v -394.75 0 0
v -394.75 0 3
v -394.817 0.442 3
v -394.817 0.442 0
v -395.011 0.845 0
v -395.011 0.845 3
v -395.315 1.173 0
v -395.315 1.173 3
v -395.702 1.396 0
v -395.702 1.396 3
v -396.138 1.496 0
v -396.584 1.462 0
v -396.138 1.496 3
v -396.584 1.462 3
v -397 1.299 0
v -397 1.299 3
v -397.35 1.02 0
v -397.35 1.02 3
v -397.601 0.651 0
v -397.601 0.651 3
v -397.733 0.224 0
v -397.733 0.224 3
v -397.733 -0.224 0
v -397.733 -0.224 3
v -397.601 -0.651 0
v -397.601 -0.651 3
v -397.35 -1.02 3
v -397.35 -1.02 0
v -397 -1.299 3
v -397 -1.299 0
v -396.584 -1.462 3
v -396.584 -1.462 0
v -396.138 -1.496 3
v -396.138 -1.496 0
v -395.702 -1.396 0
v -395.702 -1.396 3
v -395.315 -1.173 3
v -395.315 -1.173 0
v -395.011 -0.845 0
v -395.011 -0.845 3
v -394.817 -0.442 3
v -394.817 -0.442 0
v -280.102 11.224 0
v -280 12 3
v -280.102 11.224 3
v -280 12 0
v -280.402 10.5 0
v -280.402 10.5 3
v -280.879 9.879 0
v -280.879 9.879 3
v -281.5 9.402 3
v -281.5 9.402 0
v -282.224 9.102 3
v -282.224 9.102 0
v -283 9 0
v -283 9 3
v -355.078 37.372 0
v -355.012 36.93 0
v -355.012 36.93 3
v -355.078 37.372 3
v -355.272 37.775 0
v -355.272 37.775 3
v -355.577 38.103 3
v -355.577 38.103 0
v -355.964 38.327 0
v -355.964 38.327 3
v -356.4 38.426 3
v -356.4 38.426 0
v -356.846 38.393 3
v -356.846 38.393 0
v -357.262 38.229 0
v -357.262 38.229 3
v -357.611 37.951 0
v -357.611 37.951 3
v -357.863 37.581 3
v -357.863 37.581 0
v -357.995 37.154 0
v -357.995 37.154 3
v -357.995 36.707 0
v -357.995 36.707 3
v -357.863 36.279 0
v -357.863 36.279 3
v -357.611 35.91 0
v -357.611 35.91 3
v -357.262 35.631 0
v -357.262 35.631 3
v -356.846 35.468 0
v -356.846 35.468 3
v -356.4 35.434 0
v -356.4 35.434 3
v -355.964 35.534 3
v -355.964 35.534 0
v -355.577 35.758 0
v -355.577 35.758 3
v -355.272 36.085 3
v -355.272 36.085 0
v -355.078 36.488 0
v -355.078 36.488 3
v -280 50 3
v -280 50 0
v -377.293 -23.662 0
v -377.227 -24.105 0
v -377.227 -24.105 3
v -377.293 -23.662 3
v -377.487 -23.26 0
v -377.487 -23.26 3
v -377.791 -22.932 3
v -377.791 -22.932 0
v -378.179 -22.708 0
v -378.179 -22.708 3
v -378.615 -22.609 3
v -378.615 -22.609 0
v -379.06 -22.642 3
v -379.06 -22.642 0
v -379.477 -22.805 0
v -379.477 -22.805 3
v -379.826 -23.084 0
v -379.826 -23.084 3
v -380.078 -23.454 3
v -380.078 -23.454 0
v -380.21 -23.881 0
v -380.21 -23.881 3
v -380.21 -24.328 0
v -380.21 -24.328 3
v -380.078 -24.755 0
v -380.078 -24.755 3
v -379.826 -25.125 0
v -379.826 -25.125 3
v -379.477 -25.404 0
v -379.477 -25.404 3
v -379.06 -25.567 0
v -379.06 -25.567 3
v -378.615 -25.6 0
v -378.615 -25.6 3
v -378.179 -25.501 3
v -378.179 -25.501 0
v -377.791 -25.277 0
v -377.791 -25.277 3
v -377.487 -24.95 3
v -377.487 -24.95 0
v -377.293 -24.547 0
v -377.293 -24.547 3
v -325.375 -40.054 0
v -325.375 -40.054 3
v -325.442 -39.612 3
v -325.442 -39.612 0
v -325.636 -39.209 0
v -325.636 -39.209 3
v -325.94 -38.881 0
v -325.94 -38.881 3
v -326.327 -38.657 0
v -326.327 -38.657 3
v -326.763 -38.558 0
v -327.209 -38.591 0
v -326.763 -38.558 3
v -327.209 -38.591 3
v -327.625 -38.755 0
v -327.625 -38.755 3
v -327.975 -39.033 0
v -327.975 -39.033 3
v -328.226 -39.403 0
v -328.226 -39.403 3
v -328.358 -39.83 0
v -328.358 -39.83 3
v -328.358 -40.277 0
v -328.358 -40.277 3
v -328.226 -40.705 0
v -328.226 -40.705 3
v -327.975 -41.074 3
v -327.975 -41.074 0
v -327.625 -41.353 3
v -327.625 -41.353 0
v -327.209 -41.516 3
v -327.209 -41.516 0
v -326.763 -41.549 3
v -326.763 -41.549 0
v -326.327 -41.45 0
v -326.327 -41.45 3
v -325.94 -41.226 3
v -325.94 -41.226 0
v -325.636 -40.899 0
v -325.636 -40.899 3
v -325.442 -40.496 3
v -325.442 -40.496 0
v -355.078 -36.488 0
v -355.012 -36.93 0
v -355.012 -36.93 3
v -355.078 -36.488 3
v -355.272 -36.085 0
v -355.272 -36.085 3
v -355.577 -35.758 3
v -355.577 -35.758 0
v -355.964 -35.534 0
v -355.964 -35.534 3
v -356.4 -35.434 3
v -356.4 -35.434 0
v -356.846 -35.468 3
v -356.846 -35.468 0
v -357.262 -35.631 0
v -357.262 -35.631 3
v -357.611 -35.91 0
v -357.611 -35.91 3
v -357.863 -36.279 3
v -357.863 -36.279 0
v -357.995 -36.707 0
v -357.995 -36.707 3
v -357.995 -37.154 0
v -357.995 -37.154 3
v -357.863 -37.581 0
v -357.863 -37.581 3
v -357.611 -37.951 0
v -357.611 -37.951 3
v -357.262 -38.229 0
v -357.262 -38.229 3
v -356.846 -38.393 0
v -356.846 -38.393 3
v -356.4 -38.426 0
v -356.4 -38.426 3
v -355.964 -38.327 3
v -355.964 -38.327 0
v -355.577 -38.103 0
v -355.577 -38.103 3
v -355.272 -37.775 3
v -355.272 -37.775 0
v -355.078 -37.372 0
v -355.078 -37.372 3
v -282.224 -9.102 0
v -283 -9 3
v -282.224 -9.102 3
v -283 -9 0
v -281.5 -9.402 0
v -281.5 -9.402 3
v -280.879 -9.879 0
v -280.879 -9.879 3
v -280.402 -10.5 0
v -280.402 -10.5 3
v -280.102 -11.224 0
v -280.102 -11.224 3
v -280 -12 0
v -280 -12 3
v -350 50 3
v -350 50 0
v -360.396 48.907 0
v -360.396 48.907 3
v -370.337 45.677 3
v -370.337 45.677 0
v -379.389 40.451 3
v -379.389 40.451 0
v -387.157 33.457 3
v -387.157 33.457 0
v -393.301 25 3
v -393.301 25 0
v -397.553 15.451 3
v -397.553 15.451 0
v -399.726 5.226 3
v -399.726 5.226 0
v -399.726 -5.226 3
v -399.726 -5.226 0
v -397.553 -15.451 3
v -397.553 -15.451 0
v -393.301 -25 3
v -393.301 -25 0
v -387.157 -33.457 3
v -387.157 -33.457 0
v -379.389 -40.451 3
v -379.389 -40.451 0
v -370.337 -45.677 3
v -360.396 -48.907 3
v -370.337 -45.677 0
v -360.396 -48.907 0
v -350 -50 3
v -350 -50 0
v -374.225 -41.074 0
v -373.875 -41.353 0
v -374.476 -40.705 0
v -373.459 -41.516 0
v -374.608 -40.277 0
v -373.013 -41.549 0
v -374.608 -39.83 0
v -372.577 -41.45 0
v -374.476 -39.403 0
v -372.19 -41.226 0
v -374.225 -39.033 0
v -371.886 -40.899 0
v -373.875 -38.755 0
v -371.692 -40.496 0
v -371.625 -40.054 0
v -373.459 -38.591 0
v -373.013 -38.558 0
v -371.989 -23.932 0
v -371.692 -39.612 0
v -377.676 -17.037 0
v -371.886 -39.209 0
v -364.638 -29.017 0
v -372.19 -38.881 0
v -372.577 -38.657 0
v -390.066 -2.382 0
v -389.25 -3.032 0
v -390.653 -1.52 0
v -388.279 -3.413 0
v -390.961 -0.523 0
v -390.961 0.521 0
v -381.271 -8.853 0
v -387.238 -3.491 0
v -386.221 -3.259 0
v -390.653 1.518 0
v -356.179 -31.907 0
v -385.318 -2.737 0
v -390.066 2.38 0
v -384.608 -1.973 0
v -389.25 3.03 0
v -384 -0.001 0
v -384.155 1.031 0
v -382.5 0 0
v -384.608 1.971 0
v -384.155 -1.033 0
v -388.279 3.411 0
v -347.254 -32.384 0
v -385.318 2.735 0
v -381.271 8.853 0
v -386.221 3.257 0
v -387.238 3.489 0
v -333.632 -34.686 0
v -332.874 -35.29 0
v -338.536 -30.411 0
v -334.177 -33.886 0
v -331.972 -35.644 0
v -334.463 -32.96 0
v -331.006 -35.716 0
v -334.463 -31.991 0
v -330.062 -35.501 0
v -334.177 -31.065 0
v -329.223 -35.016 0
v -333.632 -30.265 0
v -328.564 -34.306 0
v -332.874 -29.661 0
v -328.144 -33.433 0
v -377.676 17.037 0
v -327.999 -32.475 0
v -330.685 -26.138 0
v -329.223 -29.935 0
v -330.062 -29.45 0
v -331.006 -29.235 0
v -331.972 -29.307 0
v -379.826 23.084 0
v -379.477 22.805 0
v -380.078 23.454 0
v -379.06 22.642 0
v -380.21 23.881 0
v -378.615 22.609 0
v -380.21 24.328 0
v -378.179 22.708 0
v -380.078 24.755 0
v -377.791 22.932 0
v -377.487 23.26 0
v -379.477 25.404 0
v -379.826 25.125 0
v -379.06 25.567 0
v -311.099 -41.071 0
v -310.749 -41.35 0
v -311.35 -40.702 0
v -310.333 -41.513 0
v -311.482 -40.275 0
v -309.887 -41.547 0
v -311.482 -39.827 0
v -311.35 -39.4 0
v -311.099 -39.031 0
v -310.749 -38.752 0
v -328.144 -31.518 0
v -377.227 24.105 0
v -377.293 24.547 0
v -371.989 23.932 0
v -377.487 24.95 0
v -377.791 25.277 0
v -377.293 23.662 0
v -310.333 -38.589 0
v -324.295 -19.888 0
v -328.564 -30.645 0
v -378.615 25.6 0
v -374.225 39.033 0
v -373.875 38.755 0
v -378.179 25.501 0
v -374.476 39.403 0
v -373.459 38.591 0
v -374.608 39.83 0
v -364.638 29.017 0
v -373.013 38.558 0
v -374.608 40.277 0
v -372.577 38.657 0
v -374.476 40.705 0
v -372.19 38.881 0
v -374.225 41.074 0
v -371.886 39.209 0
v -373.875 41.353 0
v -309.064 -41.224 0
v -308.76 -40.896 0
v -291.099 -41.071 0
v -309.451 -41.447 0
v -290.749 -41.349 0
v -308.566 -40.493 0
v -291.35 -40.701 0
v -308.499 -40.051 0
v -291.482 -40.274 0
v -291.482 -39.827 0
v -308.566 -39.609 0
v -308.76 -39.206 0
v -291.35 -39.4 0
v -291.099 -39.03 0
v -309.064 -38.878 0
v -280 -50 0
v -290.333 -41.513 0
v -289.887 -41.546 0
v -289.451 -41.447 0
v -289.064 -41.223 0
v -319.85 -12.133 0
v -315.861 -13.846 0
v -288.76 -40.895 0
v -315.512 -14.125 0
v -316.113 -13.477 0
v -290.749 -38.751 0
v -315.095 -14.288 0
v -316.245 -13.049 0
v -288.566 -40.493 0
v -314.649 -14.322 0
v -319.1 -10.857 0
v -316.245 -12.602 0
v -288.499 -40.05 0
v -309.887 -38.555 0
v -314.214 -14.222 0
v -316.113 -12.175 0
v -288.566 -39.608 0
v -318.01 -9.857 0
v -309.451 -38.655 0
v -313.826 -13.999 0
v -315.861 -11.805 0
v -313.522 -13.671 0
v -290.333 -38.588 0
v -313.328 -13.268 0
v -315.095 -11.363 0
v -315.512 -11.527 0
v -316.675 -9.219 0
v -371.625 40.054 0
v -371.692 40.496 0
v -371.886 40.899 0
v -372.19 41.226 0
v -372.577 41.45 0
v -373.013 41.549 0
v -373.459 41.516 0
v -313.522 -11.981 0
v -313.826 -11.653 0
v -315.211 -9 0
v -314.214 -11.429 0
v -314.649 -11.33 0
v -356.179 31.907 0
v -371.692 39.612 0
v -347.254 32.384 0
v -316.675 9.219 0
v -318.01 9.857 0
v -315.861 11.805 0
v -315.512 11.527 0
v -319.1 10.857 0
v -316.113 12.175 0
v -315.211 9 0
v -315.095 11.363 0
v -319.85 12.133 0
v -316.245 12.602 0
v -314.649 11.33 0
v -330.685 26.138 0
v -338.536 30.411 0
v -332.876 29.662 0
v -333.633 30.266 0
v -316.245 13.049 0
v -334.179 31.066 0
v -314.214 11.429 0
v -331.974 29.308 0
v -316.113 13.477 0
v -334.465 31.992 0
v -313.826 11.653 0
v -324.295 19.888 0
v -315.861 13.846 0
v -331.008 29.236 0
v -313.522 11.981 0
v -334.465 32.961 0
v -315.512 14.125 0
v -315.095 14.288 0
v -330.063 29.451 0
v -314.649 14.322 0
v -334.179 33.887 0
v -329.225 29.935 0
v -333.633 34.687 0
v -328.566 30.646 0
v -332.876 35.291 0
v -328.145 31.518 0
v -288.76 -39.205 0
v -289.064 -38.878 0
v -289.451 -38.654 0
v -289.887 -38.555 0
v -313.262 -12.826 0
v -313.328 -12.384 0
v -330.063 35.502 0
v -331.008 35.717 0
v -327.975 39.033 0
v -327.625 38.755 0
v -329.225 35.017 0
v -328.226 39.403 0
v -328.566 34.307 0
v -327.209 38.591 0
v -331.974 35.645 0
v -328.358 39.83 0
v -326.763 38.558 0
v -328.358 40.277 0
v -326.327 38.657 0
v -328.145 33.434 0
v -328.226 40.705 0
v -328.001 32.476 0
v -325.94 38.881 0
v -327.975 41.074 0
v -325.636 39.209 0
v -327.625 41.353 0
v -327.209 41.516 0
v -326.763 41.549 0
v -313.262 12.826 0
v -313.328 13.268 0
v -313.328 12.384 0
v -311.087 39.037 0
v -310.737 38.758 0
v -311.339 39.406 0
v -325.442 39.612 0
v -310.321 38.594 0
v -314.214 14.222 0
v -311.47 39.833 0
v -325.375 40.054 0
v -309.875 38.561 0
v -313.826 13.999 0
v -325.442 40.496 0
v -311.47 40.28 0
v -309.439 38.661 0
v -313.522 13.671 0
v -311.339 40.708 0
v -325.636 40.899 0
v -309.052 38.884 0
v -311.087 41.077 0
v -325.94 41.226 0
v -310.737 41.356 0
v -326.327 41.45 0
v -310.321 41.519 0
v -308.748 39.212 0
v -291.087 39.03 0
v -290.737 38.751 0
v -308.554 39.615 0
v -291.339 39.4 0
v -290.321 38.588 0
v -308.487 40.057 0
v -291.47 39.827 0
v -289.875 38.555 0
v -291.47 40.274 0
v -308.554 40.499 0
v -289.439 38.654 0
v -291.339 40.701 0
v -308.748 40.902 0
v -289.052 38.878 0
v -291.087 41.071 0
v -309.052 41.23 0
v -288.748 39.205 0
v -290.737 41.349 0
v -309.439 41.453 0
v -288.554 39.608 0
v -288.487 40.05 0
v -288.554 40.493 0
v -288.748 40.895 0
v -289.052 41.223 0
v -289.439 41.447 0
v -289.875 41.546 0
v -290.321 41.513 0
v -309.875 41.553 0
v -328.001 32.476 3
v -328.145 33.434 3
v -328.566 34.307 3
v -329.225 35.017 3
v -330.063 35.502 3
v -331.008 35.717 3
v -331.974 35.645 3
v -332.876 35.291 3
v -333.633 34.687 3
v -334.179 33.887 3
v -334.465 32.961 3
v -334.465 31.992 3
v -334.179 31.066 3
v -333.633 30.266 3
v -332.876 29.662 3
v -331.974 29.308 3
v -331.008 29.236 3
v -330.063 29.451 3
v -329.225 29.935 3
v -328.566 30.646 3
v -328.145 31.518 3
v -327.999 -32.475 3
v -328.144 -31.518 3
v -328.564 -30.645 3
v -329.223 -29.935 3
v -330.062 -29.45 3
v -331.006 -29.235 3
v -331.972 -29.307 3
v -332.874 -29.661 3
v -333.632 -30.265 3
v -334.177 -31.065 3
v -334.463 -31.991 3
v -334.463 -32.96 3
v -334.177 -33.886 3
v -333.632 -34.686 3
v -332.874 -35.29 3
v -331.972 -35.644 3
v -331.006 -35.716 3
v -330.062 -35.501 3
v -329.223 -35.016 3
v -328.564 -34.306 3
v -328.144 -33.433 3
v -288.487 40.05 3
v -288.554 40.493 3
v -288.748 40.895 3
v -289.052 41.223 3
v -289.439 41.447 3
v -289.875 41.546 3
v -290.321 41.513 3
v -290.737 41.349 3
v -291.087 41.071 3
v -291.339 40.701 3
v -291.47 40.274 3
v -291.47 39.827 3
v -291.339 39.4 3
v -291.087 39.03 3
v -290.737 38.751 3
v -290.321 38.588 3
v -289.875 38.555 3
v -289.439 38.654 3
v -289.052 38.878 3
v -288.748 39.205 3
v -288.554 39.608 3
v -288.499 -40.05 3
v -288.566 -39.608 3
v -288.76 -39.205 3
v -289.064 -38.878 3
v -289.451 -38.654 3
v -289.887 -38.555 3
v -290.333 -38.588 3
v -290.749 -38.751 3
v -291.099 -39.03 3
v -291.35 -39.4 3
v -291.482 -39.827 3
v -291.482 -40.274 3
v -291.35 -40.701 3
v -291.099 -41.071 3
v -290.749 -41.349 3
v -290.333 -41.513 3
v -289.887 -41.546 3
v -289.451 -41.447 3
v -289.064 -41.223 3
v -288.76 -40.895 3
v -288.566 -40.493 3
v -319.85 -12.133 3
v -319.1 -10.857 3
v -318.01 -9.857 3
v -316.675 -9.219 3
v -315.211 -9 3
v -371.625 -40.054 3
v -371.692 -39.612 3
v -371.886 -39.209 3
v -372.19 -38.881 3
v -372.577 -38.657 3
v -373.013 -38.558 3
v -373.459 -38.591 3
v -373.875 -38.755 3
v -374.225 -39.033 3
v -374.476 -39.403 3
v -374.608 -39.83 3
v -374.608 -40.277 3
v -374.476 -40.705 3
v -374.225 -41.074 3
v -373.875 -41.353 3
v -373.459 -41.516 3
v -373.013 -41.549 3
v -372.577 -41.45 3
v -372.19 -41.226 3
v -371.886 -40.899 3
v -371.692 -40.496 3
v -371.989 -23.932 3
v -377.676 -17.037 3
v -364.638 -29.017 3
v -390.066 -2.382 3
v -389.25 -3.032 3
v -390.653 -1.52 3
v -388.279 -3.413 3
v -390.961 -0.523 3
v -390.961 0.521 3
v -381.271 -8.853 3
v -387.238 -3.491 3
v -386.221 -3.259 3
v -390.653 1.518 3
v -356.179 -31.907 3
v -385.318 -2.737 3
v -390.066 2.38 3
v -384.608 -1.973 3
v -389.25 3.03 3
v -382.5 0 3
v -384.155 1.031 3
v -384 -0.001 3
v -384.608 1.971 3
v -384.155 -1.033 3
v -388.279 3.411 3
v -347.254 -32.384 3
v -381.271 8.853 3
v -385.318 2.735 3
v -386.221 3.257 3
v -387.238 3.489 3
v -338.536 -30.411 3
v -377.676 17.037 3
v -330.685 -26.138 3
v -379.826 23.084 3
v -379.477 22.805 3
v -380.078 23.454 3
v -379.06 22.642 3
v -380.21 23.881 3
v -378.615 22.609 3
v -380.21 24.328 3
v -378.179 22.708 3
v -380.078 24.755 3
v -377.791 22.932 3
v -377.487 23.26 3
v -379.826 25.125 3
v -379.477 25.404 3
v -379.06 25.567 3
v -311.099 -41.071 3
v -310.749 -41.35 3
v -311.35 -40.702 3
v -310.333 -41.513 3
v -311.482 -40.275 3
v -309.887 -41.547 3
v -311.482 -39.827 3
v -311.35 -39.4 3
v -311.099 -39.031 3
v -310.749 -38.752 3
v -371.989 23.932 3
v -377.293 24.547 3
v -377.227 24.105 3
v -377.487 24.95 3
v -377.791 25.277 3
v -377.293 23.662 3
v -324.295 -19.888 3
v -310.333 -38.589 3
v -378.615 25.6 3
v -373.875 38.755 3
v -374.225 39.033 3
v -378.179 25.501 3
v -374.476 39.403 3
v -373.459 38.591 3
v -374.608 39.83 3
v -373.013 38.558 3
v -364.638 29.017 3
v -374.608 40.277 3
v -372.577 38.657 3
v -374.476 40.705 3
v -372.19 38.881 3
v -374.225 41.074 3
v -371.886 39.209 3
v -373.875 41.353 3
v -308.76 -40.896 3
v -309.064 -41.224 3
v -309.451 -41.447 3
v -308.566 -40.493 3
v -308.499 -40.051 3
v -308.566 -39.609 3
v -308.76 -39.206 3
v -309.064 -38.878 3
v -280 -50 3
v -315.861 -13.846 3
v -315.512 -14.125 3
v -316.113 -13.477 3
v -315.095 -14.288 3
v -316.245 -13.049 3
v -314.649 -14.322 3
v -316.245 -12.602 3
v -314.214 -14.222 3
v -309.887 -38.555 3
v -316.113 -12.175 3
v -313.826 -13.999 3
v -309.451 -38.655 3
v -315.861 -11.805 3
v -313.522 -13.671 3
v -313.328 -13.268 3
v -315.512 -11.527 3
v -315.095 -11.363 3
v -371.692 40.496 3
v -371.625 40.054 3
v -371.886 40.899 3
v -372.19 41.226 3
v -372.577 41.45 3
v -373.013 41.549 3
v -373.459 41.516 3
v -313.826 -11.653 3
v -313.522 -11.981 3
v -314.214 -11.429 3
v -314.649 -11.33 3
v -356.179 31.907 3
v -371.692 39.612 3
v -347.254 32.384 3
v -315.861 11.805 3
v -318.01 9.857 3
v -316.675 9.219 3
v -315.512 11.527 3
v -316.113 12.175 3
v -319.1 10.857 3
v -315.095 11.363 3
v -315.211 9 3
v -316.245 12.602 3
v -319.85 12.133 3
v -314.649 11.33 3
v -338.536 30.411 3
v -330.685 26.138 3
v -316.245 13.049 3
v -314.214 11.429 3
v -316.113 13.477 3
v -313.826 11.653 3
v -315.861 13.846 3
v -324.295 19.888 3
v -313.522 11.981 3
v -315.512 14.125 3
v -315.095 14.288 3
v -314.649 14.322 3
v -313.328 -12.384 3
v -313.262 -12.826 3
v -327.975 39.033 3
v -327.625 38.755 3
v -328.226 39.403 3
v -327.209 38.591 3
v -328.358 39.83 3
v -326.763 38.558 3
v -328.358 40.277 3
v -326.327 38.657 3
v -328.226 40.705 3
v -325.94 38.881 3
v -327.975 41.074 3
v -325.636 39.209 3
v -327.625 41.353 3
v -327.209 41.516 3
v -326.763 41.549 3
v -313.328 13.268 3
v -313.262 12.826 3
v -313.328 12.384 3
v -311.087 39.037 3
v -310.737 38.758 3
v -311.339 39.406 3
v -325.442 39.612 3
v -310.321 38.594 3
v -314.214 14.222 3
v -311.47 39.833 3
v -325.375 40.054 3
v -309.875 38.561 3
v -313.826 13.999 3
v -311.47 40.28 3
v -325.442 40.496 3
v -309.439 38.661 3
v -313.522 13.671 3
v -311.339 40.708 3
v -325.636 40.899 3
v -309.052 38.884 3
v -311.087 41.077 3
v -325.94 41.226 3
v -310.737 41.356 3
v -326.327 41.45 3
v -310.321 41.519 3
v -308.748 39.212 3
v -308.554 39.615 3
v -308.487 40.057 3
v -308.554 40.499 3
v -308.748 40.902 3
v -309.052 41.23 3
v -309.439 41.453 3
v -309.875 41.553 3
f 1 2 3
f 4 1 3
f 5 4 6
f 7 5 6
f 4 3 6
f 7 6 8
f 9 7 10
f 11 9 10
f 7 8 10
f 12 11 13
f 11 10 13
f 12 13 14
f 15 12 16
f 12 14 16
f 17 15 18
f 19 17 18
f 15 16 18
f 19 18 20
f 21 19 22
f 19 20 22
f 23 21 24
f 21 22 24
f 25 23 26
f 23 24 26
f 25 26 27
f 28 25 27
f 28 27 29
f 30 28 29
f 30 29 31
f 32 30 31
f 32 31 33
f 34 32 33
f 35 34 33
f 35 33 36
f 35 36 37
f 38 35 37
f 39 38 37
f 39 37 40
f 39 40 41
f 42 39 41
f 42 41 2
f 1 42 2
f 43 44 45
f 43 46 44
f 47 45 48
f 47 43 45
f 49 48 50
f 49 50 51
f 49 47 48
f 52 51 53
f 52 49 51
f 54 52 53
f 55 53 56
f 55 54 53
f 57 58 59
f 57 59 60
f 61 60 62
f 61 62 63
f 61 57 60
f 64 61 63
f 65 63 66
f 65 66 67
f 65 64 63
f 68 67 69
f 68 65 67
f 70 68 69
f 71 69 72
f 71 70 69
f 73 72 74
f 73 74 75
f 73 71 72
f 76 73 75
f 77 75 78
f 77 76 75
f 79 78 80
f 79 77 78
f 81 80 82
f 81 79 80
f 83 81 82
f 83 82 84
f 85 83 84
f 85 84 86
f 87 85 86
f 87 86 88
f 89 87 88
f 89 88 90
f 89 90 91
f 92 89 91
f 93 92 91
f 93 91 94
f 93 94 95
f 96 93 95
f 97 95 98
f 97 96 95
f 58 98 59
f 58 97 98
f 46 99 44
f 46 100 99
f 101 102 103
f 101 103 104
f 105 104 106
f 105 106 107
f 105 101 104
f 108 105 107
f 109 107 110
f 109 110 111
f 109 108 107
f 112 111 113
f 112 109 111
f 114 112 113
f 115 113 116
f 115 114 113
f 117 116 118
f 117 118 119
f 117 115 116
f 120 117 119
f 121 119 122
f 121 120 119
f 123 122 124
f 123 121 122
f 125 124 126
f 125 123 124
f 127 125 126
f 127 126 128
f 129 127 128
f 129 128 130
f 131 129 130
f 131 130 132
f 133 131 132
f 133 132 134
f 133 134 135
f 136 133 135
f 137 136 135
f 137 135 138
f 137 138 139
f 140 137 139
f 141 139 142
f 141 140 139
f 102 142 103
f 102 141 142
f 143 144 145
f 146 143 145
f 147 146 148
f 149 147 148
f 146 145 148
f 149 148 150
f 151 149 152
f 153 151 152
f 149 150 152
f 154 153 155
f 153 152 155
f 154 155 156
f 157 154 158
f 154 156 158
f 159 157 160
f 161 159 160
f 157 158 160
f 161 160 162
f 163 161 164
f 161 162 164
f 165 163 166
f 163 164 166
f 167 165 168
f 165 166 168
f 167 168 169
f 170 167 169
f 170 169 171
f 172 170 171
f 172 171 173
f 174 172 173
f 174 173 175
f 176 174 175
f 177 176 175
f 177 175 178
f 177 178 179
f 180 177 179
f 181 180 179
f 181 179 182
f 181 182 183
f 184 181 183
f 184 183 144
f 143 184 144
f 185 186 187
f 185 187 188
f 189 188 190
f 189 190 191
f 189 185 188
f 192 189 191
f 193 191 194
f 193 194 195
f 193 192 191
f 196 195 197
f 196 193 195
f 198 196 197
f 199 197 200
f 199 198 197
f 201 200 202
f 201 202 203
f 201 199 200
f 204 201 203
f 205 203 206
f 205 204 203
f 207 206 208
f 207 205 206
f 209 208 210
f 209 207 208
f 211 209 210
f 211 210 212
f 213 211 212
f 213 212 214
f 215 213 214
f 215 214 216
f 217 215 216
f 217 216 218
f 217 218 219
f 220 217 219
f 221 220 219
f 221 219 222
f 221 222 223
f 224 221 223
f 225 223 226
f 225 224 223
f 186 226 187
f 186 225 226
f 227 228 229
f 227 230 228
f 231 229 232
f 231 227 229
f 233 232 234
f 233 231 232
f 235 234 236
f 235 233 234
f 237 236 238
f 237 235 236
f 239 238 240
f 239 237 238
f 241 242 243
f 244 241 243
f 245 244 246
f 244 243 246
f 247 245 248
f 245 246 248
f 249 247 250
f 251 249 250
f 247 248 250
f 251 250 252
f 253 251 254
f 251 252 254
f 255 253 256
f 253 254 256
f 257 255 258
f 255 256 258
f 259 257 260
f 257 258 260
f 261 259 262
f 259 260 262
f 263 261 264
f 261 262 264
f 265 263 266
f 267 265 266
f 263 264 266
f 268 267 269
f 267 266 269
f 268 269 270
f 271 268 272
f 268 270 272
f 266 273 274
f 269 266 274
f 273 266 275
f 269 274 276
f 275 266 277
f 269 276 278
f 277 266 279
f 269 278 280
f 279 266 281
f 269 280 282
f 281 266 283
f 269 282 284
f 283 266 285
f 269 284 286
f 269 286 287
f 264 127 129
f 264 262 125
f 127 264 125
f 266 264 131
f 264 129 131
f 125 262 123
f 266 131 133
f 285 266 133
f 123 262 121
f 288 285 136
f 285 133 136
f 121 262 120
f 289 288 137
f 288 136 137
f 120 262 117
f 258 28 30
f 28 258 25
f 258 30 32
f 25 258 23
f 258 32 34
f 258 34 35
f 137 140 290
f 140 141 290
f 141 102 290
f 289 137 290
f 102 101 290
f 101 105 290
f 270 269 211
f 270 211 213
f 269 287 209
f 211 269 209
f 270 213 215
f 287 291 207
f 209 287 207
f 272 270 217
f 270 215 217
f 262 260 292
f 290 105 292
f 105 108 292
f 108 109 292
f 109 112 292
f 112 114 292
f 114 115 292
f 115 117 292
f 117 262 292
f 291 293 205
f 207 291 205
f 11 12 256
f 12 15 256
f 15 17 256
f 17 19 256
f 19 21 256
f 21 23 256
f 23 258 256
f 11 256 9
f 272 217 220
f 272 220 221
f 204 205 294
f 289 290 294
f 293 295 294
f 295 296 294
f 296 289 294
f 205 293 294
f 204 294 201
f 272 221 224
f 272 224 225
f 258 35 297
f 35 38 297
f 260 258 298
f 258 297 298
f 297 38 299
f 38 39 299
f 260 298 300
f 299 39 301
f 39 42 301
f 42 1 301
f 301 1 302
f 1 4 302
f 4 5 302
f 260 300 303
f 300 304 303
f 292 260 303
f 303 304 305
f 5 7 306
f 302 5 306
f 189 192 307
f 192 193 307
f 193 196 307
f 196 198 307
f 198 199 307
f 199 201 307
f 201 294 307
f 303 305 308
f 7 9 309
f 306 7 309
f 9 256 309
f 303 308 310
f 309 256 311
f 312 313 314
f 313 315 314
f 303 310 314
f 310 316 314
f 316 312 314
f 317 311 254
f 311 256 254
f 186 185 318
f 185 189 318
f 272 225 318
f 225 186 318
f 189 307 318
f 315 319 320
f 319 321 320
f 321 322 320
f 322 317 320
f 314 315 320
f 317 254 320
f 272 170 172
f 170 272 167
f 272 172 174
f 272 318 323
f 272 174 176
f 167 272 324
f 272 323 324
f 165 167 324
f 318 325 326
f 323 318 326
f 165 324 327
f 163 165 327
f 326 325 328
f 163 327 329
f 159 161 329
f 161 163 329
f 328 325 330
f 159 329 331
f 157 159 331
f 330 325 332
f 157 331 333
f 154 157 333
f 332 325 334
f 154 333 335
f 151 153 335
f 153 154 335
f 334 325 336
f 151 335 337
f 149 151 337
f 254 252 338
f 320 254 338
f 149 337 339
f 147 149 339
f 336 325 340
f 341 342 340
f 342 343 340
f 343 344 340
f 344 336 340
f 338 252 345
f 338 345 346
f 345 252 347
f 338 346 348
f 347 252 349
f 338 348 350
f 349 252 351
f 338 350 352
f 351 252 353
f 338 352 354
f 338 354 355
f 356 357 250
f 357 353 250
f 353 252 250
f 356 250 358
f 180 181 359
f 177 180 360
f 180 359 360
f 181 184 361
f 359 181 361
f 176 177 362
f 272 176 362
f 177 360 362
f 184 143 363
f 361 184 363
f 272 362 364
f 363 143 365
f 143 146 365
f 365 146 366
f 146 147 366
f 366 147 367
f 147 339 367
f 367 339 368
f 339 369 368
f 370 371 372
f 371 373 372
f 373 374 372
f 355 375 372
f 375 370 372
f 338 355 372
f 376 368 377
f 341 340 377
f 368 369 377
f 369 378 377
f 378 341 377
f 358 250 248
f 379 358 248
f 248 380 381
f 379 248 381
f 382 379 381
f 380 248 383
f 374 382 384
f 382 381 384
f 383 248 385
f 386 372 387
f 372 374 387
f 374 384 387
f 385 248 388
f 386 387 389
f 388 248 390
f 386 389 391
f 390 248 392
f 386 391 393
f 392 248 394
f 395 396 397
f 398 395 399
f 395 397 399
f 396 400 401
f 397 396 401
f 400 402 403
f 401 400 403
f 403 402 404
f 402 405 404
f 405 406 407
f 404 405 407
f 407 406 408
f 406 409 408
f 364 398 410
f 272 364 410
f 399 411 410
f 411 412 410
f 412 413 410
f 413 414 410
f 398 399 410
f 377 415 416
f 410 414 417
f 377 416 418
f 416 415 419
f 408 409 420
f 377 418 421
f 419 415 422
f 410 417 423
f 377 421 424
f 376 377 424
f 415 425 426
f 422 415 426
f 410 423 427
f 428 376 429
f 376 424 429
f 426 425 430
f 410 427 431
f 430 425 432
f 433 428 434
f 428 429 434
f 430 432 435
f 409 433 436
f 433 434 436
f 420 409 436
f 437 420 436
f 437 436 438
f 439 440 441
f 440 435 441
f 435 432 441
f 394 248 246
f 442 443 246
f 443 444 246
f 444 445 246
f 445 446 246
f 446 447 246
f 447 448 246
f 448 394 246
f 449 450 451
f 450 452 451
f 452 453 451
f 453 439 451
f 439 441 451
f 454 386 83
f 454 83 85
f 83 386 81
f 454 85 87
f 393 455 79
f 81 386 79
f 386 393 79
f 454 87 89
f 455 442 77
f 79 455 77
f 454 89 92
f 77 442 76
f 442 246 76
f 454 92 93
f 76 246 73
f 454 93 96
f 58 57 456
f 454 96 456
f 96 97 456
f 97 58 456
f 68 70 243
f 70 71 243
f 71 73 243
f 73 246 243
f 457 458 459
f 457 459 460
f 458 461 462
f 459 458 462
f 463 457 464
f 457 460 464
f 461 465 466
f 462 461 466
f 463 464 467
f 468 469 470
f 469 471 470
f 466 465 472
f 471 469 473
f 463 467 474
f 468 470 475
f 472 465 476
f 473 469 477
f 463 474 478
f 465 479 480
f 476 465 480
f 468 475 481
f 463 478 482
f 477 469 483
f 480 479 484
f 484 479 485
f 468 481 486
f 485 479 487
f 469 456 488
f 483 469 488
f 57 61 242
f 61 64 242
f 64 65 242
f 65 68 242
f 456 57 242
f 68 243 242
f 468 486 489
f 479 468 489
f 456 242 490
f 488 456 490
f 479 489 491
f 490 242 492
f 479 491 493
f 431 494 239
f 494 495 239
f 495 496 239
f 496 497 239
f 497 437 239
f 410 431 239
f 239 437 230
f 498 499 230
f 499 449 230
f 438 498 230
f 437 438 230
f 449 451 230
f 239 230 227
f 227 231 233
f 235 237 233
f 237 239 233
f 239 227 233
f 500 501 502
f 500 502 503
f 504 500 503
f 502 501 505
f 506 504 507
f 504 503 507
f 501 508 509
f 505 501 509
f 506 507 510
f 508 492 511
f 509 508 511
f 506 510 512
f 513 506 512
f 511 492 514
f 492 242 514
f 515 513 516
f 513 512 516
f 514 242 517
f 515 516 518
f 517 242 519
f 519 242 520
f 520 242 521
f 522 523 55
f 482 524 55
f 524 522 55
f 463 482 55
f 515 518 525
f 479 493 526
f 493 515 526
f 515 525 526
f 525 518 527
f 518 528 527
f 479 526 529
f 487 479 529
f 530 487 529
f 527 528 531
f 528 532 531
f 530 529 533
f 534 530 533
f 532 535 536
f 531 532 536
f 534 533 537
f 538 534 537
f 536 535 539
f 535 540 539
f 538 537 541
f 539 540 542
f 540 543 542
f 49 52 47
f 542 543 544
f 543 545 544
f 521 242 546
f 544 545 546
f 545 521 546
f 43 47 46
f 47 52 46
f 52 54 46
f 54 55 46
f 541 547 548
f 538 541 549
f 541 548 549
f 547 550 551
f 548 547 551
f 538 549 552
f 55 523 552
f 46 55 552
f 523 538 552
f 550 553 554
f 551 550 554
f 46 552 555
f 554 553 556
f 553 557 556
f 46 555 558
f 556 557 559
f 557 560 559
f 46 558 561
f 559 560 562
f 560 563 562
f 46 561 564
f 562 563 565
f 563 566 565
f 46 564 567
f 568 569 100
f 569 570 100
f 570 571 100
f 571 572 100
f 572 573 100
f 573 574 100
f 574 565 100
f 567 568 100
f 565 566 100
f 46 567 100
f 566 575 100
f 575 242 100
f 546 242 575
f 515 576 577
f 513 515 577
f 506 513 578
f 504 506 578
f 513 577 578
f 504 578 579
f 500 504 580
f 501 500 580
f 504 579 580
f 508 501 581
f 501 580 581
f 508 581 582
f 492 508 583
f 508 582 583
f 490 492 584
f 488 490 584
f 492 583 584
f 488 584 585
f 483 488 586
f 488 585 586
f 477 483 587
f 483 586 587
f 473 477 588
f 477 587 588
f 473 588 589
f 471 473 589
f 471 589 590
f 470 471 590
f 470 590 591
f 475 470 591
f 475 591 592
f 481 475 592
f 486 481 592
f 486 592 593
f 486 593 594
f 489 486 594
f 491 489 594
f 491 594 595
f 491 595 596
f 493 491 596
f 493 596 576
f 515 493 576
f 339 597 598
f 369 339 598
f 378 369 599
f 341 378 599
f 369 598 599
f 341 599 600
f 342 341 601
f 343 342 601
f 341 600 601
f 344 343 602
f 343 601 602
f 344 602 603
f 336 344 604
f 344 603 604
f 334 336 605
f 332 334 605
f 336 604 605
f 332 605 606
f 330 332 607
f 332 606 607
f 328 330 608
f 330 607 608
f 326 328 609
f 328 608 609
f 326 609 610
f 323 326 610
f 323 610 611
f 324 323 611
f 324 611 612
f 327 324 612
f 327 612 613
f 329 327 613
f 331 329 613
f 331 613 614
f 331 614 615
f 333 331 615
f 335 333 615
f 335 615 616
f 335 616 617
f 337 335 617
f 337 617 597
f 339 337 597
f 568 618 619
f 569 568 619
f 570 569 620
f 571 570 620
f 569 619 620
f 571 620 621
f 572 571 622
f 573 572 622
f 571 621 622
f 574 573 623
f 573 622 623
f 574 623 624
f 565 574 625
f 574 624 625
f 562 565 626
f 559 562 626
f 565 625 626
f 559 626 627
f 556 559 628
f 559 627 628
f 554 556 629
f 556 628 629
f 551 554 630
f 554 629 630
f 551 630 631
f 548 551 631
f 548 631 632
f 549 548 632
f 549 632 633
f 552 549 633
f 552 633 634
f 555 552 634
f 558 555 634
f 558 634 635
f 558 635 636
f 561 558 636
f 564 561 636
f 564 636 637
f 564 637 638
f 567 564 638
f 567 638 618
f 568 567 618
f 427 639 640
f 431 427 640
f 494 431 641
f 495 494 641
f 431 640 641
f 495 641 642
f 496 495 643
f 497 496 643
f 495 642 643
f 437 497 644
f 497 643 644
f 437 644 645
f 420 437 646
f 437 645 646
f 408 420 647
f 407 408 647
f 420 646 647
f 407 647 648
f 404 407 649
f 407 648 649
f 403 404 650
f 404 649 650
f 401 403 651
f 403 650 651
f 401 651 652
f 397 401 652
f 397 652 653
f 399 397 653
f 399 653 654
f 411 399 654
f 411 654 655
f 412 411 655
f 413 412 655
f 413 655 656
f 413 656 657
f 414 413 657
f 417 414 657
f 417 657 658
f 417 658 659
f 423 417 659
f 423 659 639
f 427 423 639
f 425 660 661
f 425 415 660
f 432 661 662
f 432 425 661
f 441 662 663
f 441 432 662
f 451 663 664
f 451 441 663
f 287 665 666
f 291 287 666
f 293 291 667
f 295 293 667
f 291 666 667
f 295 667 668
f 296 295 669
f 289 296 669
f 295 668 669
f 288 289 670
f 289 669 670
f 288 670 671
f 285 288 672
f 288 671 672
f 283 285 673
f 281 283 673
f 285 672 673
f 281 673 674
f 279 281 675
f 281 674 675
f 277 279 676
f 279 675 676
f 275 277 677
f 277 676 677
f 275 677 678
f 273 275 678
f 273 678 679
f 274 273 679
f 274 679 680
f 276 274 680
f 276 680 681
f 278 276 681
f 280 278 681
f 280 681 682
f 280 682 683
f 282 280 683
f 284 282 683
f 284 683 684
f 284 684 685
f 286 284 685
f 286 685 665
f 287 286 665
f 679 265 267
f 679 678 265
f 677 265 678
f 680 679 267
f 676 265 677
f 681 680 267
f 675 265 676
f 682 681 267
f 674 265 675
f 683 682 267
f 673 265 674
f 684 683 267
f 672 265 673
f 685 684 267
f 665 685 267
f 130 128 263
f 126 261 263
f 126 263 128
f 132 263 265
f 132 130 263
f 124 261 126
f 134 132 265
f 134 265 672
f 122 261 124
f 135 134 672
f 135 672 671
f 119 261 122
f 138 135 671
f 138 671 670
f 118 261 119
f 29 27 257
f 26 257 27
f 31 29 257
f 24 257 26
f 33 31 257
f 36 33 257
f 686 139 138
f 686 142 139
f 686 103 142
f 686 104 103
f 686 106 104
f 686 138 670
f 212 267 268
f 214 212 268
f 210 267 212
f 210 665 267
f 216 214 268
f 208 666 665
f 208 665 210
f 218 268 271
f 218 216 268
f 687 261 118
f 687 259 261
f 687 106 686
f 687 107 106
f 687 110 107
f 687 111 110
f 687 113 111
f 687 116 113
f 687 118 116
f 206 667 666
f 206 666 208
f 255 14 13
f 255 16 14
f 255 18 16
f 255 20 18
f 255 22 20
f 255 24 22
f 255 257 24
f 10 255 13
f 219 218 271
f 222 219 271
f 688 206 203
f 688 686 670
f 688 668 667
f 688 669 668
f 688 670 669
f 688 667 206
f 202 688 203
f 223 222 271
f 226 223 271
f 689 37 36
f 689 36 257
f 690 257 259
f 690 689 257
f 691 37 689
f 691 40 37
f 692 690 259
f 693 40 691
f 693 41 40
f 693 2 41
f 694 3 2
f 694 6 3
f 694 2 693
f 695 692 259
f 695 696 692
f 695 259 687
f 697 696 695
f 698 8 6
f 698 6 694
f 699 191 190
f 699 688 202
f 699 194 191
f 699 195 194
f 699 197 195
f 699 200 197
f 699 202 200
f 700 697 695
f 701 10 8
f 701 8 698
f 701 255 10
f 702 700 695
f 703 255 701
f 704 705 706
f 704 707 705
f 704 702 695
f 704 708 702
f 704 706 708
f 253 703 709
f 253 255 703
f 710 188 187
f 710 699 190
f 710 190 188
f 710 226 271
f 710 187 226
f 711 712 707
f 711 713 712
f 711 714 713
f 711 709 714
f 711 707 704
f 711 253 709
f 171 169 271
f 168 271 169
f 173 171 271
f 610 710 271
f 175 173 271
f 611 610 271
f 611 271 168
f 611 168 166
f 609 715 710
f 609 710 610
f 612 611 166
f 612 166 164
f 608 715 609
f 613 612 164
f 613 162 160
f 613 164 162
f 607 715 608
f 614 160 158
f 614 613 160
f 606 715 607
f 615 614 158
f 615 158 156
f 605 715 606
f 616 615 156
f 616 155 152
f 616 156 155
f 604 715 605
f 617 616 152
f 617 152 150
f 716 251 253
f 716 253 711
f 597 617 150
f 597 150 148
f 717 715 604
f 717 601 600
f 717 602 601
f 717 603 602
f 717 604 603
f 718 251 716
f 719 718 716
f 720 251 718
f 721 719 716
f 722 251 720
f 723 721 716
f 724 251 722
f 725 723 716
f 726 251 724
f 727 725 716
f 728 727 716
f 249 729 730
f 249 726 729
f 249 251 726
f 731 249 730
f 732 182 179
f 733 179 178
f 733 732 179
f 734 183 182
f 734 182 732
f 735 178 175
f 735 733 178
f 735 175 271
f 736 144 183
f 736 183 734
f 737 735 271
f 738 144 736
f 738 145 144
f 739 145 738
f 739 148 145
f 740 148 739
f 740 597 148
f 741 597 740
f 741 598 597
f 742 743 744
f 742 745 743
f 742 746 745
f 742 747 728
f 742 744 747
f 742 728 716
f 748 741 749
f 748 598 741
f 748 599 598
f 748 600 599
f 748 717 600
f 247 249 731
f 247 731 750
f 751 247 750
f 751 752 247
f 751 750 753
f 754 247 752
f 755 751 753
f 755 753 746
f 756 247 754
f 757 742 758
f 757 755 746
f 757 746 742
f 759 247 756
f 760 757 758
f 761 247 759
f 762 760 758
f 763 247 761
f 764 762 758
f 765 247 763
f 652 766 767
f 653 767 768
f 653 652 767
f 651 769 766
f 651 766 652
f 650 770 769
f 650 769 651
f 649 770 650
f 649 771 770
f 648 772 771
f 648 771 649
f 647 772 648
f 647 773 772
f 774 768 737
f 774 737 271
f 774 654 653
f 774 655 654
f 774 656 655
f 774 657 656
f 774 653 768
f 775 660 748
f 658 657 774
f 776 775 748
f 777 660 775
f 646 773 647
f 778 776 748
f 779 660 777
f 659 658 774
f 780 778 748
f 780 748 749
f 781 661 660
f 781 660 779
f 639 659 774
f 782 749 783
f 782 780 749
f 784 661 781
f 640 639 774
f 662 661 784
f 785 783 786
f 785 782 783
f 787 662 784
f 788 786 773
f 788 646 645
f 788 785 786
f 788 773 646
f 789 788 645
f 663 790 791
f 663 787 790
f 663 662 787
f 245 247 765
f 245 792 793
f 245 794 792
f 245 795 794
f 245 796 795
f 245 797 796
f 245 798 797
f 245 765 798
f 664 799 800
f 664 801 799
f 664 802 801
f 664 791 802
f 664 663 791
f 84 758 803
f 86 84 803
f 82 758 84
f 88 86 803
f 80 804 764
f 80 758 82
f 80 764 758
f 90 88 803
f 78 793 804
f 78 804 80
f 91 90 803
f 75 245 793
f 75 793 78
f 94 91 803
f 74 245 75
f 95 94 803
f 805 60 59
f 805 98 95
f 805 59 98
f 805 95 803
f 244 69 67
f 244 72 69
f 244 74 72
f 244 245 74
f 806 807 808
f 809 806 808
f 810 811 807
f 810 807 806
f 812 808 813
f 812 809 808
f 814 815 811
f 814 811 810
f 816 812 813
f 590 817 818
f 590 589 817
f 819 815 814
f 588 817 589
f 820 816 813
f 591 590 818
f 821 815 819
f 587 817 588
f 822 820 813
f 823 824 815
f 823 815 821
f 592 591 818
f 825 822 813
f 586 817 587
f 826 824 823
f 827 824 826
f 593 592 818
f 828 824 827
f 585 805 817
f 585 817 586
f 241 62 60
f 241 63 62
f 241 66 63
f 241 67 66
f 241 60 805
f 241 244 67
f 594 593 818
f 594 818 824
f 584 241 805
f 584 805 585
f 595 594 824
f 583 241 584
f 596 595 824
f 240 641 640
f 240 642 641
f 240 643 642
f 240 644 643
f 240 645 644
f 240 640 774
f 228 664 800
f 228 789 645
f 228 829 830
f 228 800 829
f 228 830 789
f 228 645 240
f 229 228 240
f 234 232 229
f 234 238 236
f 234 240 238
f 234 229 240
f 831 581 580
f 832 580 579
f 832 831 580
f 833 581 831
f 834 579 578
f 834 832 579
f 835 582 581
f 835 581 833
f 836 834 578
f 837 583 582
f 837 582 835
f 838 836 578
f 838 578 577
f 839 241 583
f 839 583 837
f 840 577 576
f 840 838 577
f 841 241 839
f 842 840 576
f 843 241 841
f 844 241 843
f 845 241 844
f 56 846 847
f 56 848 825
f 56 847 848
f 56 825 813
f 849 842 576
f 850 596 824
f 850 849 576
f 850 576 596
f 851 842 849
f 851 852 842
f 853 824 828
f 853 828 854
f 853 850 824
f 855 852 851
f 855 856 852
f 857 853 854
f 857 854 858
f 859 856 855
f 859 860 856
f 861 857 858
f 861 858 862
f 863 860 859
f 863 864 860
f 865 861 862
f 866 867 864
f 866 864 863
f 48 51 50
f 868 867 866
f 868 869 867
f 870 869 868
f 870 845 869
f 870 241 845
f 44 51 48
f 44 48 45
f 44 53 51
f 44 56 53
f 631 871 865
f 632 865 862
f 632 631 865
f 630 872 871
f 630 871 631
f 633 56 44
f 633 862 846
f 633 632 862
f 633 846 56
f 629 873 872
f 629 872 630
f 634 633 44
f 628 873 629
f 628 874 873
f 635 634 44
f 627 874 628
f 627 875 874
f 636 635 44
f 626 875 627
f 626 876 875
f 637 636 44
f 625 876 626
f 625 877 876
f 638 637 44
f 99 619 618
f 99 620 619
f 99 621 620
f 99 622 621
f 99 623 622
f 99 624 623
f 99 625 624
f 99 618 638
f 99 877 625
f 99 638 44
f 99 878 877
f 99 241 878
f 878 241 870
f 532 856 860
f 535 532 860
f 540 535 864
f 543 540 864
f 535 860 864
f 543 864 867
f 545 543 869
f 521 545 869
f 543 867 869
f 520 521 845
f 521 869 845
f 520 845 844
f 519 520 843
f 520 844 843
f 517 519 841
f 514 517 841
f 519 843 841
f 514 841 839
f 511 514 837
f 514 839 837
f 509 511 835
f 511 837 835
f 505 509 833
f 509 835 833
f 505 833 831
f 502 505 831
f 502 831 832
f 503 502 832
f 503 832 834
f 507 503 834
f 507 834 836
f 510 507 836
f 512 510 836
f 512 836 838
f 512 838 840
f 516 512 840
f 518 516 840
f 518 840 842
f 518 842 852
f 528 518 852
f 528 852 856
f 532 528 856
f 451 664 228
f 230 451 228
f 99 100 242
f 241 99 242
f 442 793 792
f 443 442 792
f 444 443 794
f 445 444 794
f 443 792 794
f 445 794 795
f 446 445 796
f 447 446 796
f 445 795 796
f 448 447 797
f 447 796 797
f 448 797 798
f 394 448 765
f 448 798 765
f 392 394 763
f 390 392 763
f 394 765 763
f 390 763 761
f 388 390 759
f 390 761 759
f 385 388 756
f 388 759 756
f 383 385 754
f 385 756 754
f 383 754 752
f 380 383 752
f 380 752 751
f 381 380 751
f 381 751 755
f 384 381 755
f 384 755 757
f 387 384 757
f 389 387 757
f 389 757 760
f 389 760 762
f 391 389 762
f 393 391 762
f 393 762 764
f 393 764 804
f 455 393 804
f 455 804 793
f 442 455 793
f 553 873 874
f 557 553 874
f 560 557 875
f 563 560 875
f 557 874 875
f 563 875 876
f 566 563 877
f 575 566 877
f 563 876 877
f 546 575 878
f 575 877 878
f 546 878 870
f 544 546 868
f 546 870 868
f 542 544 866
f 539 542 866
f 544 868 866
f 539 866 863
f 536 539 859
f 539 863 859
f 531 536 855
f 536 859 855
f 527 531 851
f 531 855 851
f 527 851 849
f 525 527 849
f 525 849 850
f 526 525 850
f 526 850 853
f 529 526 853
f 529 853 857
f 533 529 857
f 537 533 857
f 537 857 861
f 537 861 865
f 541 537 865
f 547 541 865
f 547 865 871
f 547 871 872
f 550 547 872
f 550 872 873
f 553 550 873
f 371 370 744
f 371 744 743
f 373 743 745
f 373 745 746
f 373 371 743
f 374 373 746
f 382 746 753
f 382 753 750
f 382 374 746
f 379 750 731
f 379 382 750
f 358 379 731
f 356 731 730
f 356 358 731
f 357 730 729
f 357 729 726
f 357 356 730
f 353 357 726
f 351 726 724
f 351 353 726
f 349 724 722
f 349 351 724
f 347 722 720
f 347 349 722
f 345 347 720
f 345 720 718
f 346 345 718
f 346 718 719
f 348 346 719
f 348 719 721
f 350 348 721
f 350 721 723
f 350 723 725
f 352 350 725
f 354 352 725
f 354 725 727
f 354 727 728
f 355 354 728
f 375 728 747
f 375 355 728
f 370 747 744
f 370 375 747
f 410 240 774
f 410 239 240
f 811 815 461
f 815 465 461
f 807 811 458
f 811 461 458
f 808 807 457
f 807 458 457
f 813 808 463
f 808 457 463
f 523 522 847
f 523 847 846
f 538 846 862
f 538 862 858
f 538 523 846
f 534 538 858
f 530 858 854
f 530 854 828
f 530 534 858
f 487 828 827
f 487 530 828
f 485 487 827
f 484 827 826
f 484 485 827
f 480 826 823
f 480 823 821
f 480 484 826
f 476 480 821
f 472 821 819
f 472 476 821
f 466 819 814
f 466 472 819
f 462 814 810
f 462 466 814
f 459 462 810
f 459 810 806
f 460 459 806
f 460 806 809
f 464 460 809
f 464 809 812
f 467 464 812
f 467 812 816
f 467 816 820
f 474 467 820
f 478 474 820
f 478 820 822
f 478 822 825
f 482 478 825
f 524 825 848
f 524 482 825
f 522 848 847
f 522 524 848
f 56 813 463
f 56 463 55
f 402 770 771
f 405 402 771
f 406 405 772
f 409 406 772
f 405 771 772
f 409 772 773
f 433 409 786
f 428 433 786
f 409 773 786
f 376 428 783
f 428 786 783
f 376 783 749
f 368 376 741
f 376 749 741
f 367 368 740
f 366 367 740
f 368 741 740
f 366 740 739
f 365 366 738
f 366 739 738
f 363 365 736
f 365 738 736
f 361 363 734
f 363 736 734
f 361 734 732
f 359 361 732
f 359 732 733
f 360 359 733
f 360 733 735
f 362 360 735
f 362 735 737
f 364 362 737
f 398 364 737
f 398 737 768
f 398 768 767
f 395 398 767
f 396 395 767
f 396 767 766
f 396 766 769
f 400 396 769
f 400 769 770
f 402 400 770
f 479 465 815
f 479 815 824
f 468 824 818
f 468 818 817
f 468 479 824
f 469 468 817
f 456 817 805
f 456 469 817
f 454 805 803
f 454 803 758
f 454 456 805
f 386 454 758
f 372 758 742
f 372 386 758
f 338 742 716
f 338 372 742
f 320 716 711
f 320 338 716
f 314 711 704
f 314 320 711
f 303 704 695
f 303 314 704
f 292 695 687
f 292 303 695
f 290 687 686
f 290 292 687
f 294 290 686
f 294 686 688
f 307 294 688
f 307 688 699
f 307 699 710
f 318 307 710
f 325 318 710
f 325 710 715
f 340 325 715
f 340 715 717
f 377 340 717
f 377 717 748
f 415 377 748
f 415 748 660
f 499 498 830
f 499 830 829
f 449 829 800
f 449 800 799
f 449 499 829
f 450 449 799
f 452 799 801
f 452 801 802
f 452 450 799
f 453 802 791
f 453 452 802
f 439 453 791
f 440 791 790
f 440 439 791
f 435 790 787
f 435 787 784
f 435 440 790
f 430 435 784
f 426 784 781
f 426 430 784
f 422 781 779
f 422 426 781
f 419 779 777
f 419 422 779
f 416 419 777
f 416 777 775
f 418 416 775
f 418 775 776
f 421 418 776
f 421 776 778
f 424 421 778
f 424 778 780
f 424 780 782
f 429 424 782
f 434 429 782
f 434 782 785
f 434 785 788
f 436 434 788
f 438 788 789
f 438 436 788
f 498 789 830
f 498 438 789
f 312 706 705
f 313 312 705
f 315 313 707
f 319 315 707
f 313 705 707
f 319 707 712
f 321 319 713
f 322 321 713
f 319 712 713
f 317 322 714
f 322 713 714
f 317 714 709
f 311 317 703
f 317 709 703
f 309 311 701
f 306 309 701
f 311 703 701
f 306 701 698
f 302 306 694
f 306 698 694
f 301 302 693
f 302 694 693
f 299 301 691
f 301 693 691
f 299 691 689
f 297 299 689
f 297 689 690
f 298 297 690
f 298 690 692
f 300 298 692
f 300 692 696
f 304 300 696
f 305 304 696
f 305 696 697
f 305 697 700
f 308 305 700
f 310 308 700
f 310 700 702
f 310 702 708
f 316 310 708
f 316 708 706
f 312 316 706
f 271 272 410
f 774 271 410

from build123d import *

# Parameters (mm, degrees)
SKETCH_1_R          = 1.5
SKETCH_1_R_2        = 32.5
EXTRUDE_1_DEPTH     = 3
SKETCH_2_R          = 3.25
SKETCH_2_R_2        = 3.5
SKETCH_2_W          = 16
SKETCH_2_H          = 18
CUT_EXTRUDE_2_DEPTH = 10
FILLET_2_R          = 5
FILLET_3_R          = 2
CUT_EXTRUDE_START   = -10
SKETCH_3_R          = 1.5
SKETCH_3_R_2        = 32.5
CUT_EXTRUDE_3_DEPTH = 10
SKETCH_5_R          = 1.5
CUT_EXTRUDE_4_DEPTH = 10
SKETCH_6_R          = 1.5
CUT_EXTRUDE_5_DEPTH = 404.124050386
SKETCH_7_R          = 1.5
CUT_EXTRUDE_6_DEPTH = 404.124050386
SKETCH_8_W          = 45.011761124
SKETCH_8_H          = 18
CUT_EXTRUDE_7_DEPTH = 10
FILLET_4_R          = 3


with BuildPart() as part:
    # 草图1 → 凸台-拉伸1 (new body)
    with BuildSketch(Plane.XY):
        with BuildLine():
            Line((-10, 50), (-350, 50))
            ThreePointArc((-350, 50), (-400, 0), (-350, -50))
            Line((-350, -50), (-10, -50))
            ThreePointArc((-10, -50), (40, 0), (-10, 50))
        make_face()
        with Locations((-387.5, 0)):
            Circle(SKETCH_1_R, mode=Mode.SUBTRACT)
        with Locations((-378.726666617, 24.104535363)):
            Circle(SKETCH_1_R, mode=Mode.SUBTRACT)
        with Locations((-356.511806663, 36.930290738)):
            Circle(SKETCH_1_R, mode=Mode.SUBTRACT)
        with Locations((-331.25, 32.475952642)):
            Circle(SKETCH_1_R, mode=Mode.SUBTRACT)
        with Locations((-314.761526721, 12.825755375)):
            Circle(SKETCH_1_R, mode=Mode.SUBTRACT)
        with Locations((-314.761526721, -12.825755375)):
            Circle(SKETCH_1_R, mode=Mode.SUBTRACT)
        with Locations((-331.25, -32.475952642)):
            Circle(SKETCH_1_R, mode=Mode.SUBTRACT)
        with Locations((-356.511806663, -36.930290738)):
            Circle(SKETCH_1_R, mode=Mode.SUBTRACT)
        with Locations((-378.726666617, -24.104535363)):
            Circle(SKETCH_1_R, mode=Mode.SUBTRACT)
        with Locations((-350, 0)):
            Circle(SKETCH_1_R_2, mode=Mode.SUBTRACT)
        with Locations((-10, 0)):
            Circle(SKETCH_1_R_2, mode=Mode.SUBTRACT)
        with Locations((18.726666617, -24.104535363)):
            Circle(SKETCH_1_R, mode=Mode.SUBTRACT)
        with Locations((-3.488193337, -36.930290738)):
            Circle(SKETCH_1_R, mode=Mode.SUBTRACT)
        with Locations((-28.75, -32.475952642)):
            Circle(SKETCH_1_R, mode=Mode.SUBTRACT)
        with Locations((-45.238473279, -12.825755375)):
            Circle(SKETCH_1_R, mode=Mode.SUBTRACT)
        with Locations((-45.238473279, 12.825755375)):
            Circle(SKETCH_1_R, mode=Mode.SUBTRACT)
        with Locations((-28.75, 32.475952642)):
            Circle(SKETCH_1_R, mode=Mode.SUBTRACT)
        with Locations((-3.488193337, 36.930290738)):
            Circle(SKETCH_1_R, mode=Mode.SUBTRACT)
        with Locations((18.726666617, 24.104535363)):
            Circle(SKETCH_1_R, mode=Mode.SUBTRACT)
        with Locations((27.5, 0)):
            Circle(SKETCH_1_R, mode=Mode.SUBTRACT)
    extrude(amount=EXTRUDE_1_DEPTH)

    # 草图2 → 切除-拉伸2 (cut)
    with BuildSketch(Plane.XY.offset(3)):
        with Locations((-331.250850225, 32.476443505)):
            Circle(SKETCH_2_R)
        with Locations((-387.499999987, -0.000981748)):
            Circle(SKETCH_2_R_2)
        with Locations((-331.249149788, -32.475461757)):
            Circle(SKETCH_2_R)
        with Locations((-317.5, 0)):
            Rectangle(SKETCH_2_W, SKETCH_2_H)
    extrude(amount=-CUT_EXTRUDE_2_DEPTH, mode=Mode.SUBTRACT)

    # 圆角2
    fillet_2_edges = [part.edges().sort_by_distance(p)[0] for p in [
        (-318.771007061, -9, 1.5),
        (-318.771007061, 9, 1.5),
    ]]
    fillet(fillet_2_edges, radius=FILLET_2_R)

    # 圆角3
    fillet_3_edges = [part.edges().sort_by_distance(p)[0] for p in [
        (-309.5, 9, 1.5),
        (-309.5, -9, 1.5),
    ]]
    fillet(fillet_3_edges, radius=FILLET_3_R)

    # 草图3 → 切除-拉伸3 (cut)
    with BuildSketch(Plane.XY.offset(3).offset(CUT_EXTRUDE_START)):
        with BuildLine():
            Line((-280, -50), (-180, -50))
            Line((-180, -50), (-10, -50))
            ThreePointArc((-10, -50), (40, 0), (-10, 50))
            Line((-10, 50), (-280, 50))
            Line((-280, 50), (-280, -50))
        make_face()
        with Locations((-28.75, -32.475952642)):
            Circle(SKETCH_3_R, mode=Mode.SUBTRACT)
        with Locations((-3.488193337, -36.930290738)):
            Circle(SKETCH_3_R, mode=Mode.SUBTRACT)
        with Locations((18.726666617, -24.104535363)):
            Circle(SKETCH_3_R, mode=Mode.SUBTRACT)
        with Locations((-45.238473279, -12.825755375)):
            Circle(SKETCH_3_R, mode=Mode.SUBTRACT)
        with Locations((-45.238473279, 12.825755375)):
            Circle(SKETCH_3_R, mode=Mode.SUBTRACT)
        with Locations((-10, 0)):
            Circle(SKETCH_3_R_2, mode=Mode.SUBTRACT)
        with Locations((27.5, 0)):
            Circle(SKETCH_3_R, mode=Mode.SUBTRACT)
        with Locations((-28.75, 32.475952642)):
            Circle(SKETCH_3_R, mode=Mode.SUBTRACT)
        with Locations((18.726666617, 24.104535363)):
            Circle(SKETCH_3_R, mode=Mode.SUBTRACT)
        with Locations((-3.488193337, 36.930290738)):
            Circle(SKETCH_3_R, mode=Mode.SUBTRACT)
    extrude(amount=CUT_EXTRUDE_3_DEPTH, mode=Mode.SUBTRACT)

    # 草图5 → 切除-拉伸4 (cut)
    with BuildSketch(Plane.XY.offset(3)):
        with Locations((-396.25, 0)):
            Circle(SKETCH_5_R)
    extrude(amount=-CUT_EXTRUDE_4_DEPTH, mode=Mode.SUBTRACT)

    # 草图6 → 切除-拉伸5 (cut, through all)
    with BuildSketch(Plane.XY.offset(3)):
        with Locations((-396.25, 0)):
            Circle(SKETCH_6_R)
        with Locations((-373.125, 40.053674925)):
            Circle(SKETCH_6_R)
        with Locations((-326.875, 40.053674925)):
            Circle(SKETCH_6_R)
        with Locations((-303.75, 0)):
            Circle(SKETCH_6_R)
        with Locations((-326.875, -40.053674925)):
            Circle(SKETCH_6_R)
        with Locations((-373.125, -40.053674925)):
            Circle(SKETCH_6_R)
    extrude(amount=-CUT_EXTRUDE_5_DEPTH, mode=Mode.SUBTRACT)

    # 草图7 → 切除-拉伸6 (cut, through all)
    with BuildSketch(Plane.XY.offset(3)):
        with Locations((-309.987078995, 40.056872182)):
            Circle(SKETCH_7_R)
        with Locations((-289.987080036, 40.050420343)):
            Circle(SKETCH_7_R)
        with Locations((-309.998951455, -40.050946012)):
            Circle(SKETCH_7_R)
        with Locations((-289.998951462, -40.050422413)):
            Circle(SKETCH_7_R)
    extrude(amount=-CUT_EXTRUDE_6_DEPTH, mode=Mode.SUBTRACT)

    # 草图8 → 切除-拉伸7 (cut)
    with BuildSketch(Plane.XY.offset(3)):
        with Locations((-290.849795651, 0)):
            Rectangle(SKETCH_8_W, SKETCH_8_H)
    extrude(amount=-CUT_EXTRUDE_7_DEPTH, mode=Mode.SUBTRACT)

    # 圆角4
    fillet_4_edges = [part.edges().sort_by_distance(p)[0] for p in [
        (-280, -9, 1.5),
        (-280, 9, 1.5),
    ]]
    fillet(fillet_4_edges, radius=FILLET_4_R)


solid = part.part
